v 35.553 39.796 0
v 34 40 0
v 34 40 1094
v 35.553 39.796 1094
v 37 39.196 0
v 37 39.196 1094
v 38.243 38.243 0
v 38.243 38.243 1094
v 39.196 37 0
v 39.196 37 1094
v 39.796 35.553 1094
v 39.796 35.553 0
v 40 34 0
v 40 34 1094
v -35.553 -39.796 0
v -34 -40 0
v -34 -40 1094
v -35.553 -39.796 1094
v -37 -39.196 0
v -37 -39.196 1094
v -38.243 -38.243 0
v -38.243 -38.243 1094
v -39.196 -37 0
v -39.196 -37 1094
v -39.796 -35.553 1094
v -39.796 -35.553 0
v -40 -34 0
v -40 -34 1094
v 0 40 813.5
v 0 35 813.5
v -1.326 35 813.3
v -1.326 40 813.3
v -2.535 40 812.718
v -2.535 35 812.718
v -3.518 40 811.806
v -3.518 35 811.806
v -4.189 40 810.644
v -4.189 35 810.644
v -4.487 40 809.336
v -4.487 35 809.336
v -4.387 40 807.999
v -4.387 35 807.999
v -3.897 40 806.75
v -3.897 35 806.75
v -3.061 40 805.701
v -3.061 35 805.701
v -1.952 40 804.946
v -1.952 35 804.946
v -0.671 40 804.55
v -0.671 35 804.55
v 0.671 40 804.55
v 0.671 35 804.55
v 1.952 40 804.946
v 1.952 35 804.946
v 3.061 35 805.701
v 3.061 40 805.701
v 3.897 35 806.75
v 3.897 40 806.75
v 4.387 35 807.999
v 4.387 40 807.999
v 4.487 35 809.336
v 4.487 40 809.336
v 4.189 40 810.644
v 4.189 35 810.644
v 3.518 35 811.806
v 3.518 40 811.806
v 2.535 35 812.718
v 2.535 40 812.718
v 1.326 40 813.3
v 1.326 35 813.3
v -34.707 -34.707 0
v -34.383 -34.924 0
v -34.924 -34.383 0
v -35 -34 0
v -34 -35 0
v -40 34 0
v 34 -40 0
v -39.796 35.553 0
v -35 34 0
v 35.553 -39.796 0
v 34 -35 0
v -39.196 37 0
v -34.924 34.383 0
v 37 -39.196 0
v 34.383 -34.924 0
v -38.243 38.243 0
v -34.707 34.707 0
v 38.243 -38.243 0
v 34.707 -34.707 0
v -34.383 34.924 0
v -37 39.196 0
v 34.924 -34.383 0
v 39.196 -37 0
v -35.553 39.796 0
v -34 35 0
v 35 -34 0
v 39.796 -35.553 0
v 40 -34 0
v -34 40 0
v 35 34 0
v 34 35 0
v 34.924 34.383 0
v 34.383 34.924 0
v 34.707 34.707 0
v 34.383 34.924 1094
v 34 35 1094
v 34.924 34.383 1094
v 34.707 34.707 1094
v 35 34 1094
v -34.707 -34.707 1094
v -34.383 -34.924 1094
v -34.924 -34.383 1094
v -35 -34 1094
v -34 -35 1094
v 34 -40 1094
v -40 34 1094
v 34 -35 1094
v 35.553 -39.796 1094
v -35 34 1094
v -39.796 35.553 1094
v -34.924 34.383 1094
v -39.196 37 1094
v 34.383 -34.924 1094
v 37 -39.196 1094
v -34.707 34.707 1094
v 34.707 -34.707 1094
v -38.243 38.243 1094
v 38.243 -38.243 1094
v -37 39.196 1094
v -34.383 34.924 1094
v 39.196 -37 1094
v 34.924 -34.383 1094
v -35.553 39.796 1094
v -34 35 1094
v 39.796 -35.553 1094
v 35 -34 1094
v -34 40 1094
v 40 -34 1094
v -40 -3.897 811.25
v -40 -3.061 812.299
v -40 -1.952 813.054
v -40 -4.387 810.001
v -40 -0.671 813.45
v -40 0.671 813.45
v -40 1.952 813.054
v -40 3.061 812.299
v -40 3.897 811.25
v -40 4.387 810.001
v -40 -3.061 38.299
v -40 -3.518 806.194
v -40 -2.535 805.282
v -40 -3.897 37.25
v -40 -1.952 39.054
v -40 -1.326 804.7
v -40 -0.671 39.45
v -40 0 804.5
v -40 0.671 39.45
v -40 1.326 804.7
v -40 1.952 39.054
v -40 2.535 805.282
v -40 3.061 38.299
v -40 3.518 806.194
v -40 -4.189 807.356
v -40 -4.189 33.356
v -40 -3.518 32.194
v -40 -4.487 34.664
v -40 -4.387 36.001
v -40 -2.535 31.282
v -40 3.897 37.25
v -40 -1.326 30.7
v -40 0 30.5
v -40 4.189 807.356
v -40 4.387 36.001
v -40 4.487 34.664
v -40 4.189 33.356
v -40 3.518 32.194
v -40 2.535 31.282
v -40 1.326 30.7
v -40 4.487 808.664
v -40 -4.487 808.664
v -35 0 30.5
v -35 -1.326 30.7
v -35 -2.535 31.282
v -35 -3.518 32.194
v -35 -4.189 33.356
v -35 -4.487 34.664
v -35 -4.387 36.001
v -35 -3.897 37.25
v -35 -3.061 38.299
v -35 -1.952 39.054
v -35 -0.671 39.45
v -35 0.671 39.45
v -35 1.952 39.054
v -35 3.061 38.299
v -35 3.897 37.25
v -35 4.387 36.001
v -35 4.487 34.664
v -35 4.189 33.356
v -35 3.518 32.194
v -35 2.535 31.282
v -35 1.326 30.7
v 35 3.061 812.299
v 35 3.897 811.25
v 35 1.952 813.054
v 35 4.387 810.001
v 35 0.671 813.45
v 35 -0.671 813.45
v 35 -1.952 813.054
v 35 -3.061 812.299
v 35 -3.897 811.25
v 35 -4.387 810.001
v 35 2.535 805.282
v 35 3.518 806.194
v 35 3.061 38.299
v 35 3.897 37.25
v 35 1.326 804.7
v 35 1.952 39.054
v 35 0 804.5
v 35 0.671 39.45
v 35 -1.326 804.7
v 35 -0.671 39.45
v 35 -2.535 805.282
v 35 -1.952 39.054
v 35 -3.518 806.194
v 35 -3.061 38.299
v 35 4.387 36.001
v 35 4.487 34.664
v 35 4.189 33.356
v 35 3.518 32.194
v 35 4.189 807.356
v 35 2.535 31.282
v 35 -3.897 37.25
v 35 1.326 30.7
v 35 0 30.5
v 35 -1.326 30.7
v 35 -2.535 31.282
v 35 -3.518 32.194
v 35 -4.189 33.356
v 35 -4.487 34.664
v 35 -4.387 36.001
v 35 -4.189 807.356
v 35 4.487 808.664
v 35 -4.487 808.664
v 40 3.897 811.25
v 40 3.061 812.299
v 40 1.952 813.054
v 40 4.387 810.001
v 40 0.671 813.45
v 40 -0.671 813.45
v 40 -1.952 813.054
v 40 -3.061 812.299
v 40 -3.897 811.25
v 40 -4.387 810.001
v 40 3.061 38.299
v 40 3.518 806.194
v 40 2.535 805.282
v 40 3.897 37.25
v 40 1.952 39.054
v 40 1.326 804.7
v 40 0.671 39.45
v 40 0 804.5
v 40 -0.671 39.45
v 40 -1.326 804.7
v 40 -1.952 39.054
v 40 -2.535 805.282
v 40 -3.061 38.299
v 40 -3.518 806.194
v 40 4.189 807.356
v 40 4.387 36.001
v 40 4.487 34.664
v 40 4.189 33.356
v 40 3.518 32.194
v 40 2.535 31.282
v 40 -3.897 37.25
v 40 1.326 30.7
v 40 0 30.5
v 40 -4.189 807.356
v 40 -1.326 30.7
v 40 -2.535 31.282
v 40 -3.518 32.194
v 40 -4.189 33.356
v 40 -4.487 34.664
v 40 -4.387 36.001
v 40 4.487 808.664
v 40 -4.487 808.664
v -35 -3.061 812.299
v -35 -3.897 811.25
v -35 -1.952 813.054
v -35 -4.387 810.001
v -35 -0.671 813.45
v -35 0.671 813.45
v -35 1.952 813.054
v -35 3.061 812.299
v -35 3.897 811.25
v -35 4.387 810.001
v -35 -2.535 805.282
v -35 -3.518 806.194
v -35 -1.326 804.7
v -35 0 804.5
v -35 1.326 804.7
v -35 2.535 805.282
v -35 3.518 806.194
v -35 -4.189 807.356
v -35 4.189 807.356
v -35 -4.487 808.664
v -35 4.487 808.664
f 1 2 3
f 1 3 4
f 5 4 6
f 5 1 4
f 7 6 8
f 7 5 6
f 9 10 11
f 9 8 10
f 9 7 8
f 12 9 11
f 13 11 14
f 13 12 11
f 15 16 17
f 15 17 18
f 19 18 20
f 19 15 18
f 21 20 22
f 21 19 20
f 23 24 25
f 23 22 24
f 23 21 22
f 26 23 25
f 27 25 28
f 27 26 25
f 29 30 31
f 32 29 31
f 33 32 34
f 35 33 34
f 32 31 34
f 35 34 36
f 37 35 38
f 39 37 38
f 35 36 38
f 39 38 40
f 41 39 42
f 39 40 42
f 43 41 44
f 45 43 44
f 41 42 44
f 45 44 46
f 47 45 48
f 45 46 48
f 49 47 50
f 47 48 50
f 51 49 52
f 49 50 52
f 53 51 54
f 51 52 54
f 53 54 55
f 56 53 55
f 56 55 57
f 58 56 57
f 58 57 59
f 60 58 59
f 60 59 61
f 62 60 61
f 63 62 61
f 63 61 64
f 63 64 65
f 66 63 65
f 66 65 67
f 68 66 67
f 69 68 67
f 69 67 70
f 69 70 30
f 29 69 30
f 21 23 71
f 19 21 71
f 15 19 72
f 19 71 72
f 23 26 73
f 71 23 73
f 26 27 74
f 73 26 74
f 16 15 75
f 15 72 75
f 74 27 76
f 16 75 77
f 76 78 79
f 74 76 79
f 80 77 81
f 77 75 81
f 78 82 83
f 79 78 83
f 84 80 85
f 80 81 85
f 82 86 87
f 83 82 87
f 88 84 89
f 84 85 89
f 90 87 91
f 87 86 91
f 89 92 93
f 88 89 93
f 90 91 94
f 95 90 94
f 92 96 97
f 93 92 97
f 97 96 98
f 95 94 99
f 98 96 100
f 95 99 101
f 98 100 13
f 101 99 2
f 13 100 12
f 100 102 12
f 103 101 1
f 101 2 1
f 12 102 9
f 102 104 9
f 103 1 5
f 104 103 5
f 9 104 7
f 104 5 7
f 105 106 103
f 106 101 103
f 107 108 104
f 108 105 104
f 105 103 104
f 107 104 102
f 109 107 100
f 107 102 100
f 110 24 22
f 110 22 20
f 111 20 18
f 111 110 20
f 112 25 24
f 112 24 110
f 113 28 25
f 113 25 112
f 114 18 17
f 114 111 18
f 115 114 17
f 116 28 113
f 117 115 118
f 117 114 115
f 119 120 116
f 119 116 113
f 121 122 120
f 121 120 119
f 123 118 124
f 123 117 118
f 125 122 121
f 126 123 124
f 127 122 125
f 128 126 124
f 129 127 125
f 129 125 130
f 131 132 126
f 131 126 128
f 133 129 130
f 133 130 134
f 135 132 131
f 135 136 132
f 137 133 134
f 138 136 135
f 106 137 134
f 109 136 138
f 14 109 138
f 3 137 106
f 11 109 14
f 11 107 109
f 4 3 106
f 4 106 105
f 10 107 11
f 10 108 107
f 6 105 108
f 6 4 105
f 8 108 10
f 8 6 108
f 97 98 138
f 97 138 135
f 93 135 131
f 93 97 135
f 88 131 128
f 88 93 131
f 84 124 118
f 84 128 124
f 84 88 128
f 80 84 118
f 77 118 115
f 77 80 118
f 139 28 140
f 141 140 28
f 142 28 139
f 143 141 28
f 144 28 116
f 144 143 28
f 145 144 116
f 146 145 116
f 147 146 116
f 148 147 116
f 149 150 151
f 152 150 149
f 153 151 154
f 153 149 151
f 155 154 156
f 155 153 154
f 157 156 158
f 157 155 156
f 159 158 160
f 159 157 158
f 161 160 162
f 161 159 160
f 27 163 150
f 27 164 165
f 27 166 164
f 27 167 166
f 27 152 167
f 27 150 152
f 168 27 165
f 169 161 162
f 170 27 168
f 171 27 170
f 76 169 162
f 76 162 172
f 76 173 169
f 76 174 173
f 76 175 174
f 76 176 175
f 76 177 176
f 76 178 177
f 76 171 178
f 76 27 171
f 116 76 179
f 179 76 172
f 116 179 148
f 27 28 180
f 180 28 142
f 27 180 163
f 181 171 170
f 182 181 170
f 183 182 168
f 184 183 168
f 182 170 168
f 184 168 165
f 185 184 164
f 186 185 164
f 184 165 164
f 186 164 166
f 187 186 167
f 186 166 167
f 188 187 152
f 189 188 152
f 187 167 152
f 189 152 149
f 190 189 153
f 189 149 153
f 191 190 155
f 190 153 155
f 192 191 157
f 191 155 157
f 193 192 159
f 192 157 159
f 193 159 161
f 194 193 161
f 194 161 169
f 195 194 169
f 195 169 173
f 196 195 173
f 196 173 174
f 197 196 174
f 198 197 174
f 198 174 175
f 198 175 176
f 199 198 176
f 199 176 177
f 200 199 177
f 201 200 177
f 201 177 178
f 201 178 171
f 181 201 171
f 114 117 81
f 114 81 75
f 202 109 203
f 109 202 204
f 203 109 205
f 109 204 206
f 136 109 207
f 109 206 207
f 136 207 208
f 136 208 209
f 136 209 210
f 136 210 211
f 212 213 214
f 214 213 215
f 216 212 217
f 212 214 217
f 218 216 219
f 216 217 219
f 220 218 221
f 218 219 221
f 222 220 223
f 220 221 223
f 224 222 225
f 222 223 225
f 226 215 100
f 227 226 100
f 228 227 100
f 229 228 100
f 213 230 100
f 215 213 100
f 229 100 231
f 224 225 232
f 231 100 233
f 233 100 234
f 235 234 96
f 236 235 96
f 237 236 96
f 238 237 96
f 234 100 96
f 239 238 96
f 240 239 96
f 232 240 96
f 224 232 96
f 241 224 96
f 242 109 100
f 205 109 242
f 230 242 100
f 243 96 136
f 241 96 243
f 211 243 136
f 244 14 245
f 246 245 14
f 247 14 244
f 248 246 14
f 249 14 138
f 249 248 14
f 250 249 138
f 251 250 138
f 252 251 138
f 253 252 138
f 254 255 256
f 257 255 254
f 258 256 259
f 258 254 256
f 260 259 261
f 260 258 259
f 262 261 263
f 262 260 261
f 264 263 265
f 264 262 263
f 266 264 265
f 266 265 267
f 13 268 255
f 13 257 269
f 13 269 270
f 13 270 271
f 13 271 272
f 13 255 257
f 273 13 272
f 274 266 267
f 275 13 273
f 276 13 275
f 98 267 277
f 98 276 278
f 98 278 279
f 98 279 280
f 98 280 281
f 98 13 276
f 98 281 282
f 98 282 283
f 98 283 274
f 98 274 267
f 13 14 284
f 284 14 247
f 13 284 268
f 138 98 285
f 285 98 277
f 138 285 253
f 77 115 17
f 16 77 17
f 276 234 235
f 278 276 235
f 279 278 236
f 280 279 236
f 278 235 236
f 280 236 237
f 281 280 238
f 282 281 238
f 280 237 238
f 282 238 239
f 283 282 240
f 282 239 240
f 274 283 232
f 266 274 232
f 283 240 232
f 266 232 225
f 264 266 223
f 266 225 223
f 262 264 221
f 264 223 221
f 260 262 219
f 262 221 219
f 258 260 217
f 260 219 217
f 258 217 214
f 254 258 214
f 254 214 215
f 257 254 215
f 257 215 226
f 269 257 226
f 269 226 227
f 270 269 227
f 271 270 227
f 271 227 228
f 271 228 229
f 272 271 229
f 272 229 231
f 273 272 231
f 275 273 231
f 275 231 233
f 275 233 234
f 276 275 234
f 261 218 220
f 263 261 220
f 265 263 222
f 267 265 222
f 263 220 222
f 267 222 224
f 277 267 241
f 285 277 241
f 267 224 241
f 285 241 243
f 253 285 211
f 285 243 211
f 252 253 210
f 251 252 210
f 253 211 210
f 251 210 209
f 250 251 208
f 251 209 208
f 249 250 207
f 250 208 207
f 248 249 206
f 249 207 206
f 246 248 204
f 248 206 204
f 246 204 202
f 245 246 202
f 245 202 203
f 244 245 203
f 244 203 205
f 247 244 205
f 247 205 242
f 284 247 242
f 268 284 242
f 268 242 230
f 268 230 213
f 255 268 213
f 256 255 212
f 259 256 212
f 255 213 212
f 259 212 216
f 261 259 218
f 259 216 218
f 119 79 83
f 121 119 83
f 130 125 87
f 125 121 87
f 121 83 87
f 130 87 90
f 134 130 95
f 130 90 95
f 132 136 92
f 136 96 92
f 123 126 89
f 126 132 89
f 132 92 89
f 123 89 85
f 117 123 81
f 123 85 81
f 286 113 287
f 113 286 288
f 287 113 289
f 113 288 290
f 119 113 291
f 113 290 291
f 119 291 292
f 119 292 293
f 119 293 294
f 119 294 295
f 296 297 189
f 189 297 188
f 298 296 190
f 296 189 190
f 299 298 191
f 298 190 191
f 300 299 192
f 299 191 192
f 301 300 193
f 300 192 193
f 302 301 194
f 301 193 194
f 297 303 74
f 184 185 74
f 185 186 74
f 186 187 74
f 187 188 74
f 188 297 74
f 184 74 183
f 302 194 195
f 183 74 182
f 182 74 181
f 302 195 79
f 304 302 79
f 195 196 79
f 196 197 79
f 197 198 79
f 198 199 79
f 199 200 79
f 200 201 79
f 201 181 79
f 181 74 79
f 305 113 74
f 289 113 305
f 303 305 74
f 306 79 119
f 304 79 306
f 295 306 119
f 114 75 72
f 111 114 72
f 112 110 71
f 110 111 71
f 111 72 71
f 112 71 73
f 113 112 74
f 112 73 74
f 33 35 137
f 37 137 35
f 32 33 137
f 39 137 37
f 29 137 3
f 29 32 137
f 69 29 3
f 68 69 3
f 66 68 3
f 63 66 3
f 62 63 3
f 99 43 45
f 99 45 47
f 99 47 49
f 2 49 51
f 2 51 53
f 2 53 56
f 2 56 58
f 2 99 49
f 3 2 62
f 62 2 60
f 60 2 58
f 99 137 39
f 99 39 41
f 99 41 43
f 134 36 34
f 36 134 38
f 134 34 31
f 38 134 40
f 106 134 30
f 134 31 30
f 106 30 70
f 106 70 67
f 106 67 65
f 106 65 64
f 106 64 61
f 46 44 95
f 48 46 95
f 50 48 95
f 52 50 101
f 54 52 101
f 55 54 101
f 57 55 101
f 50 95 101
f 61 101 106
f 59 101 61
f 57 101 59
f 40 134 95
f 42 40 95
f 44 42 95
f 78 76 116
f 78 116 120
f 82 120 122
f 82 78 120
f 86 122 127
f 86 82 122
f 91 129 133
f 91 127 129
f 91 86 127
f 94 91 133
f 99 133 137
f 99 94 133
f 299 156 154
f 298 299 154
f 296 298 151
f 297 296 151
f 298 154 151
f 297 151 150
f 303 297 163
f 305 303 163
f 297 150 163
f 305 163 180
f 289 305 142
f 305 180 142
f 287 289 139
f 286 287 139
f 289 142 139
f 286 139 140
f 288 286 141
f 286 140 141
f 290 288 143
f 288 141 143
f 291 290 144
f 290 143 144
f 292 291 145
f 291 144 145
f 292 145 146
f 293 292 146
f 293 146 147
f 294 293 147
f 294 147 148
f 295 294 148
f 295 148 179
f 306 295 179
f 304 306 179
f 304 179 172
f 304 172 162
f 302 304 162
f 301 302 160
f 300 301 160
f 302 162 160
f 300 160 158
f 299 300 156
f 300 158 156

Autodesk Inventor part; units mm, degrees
ref_plane "YZ Plane" through (0, 0, 0) normal (1, 0, 0) x (0, 1, 0)
ref_plane "XZ Plane" through (0, 0, 0) normal (0, 1, 0) x (-1, 0, 0)
ref_plane "XY Plane" through (0, 0, 0) normal (0, 0, 1) x (1, 0, 0)
sketch "Sketch1" plane through (0, 0, 0) normal (0, 0, 1) x (1, 0, 0)
  line L0 (40, 34) -> (40, -34)
  line L1 (34, -40) -> (-34, -40)
  line L2 (-40, -34) -> (-40, 34)
  line L3 (-34, 40) -> (34, 40)
  arc A0 (-34, 40) -> (-40, 34) centre (-34, 34) ccw
  arc A1 (40, 34) -> (34, 40) centre (34, 34) ccw
  arc A2 (34, -40) -> (40, -34) centre (34, -34) ccw
  arc A3 (-40, -34) -> (-34, -40) centre (-34, -34) ccw
  arc A4 (-34, 35) -> (-35, 34) centre (-34, 34) ccw
  line L4 (-34, 35) -> (34, 35)
  arc A5 (35, 34) -> (34, 35) centre (34, 34) ccw
  line L5 (35, 34) -> (35, -34)
  arc A6 (34, -35) -> (35, -34) centre (34, -34) ccw
  line L6 (34, -35) -> (-34, -35)
  arc A7 (-35, -34) -> (-34, -35) centre (-34, -34) ccw
  line L7 (-35, -34) -> (-35, 34)
  point P0 (0, 0)
  point P1 (0, 0)
  point P2 (40, 40)
  point P3 (40, -40)
  point P4 (-40, -40)
  point P5 (-40, 40)
  dimension "d0" = 80
  dimension "d1" = 6
  dimension "d2" = 5
extrude "Extrusion1" add sketch "Sketch1" along normal blind 1094
sketch "Sketch2" plane through (40, -34, 0) normal (1, 0, 0) x (0, 0, -1)
  line L0 (0, 0) -> (-1094, 0) projected
  line L1 (0, 68) -> (0, 0) projected
  point P0 (-809, 34)
  point P1 (-35, 34)
  dimension "d5" = 809
  dimension "d6" = 34
  dimension "d15" = 35
hole "Hole1" at (40, 0, 809) at (40, 0, 35) direction (-1, 0, 0) diameter 9 end through all
sketch "Sketch3" plane through (-34, 40, 0) normal (0, 1, 0) x (1, 0, 0)
  line L0 (68, 0) -> (68, -1094) projected
  line L1 (0, 0) -> (68, 0) projected
  point P0 (34, -809)
  dimension "d16" = 34
  dimension "d17" = 809
hole "Hole2" at (0, 40, 809) direction (0, -1, 0) diameter 9 depth 8 tip angle 118
equation "\"d17\" = d5"
properties part number "3136 1094 48" material "Steel, Mild"
